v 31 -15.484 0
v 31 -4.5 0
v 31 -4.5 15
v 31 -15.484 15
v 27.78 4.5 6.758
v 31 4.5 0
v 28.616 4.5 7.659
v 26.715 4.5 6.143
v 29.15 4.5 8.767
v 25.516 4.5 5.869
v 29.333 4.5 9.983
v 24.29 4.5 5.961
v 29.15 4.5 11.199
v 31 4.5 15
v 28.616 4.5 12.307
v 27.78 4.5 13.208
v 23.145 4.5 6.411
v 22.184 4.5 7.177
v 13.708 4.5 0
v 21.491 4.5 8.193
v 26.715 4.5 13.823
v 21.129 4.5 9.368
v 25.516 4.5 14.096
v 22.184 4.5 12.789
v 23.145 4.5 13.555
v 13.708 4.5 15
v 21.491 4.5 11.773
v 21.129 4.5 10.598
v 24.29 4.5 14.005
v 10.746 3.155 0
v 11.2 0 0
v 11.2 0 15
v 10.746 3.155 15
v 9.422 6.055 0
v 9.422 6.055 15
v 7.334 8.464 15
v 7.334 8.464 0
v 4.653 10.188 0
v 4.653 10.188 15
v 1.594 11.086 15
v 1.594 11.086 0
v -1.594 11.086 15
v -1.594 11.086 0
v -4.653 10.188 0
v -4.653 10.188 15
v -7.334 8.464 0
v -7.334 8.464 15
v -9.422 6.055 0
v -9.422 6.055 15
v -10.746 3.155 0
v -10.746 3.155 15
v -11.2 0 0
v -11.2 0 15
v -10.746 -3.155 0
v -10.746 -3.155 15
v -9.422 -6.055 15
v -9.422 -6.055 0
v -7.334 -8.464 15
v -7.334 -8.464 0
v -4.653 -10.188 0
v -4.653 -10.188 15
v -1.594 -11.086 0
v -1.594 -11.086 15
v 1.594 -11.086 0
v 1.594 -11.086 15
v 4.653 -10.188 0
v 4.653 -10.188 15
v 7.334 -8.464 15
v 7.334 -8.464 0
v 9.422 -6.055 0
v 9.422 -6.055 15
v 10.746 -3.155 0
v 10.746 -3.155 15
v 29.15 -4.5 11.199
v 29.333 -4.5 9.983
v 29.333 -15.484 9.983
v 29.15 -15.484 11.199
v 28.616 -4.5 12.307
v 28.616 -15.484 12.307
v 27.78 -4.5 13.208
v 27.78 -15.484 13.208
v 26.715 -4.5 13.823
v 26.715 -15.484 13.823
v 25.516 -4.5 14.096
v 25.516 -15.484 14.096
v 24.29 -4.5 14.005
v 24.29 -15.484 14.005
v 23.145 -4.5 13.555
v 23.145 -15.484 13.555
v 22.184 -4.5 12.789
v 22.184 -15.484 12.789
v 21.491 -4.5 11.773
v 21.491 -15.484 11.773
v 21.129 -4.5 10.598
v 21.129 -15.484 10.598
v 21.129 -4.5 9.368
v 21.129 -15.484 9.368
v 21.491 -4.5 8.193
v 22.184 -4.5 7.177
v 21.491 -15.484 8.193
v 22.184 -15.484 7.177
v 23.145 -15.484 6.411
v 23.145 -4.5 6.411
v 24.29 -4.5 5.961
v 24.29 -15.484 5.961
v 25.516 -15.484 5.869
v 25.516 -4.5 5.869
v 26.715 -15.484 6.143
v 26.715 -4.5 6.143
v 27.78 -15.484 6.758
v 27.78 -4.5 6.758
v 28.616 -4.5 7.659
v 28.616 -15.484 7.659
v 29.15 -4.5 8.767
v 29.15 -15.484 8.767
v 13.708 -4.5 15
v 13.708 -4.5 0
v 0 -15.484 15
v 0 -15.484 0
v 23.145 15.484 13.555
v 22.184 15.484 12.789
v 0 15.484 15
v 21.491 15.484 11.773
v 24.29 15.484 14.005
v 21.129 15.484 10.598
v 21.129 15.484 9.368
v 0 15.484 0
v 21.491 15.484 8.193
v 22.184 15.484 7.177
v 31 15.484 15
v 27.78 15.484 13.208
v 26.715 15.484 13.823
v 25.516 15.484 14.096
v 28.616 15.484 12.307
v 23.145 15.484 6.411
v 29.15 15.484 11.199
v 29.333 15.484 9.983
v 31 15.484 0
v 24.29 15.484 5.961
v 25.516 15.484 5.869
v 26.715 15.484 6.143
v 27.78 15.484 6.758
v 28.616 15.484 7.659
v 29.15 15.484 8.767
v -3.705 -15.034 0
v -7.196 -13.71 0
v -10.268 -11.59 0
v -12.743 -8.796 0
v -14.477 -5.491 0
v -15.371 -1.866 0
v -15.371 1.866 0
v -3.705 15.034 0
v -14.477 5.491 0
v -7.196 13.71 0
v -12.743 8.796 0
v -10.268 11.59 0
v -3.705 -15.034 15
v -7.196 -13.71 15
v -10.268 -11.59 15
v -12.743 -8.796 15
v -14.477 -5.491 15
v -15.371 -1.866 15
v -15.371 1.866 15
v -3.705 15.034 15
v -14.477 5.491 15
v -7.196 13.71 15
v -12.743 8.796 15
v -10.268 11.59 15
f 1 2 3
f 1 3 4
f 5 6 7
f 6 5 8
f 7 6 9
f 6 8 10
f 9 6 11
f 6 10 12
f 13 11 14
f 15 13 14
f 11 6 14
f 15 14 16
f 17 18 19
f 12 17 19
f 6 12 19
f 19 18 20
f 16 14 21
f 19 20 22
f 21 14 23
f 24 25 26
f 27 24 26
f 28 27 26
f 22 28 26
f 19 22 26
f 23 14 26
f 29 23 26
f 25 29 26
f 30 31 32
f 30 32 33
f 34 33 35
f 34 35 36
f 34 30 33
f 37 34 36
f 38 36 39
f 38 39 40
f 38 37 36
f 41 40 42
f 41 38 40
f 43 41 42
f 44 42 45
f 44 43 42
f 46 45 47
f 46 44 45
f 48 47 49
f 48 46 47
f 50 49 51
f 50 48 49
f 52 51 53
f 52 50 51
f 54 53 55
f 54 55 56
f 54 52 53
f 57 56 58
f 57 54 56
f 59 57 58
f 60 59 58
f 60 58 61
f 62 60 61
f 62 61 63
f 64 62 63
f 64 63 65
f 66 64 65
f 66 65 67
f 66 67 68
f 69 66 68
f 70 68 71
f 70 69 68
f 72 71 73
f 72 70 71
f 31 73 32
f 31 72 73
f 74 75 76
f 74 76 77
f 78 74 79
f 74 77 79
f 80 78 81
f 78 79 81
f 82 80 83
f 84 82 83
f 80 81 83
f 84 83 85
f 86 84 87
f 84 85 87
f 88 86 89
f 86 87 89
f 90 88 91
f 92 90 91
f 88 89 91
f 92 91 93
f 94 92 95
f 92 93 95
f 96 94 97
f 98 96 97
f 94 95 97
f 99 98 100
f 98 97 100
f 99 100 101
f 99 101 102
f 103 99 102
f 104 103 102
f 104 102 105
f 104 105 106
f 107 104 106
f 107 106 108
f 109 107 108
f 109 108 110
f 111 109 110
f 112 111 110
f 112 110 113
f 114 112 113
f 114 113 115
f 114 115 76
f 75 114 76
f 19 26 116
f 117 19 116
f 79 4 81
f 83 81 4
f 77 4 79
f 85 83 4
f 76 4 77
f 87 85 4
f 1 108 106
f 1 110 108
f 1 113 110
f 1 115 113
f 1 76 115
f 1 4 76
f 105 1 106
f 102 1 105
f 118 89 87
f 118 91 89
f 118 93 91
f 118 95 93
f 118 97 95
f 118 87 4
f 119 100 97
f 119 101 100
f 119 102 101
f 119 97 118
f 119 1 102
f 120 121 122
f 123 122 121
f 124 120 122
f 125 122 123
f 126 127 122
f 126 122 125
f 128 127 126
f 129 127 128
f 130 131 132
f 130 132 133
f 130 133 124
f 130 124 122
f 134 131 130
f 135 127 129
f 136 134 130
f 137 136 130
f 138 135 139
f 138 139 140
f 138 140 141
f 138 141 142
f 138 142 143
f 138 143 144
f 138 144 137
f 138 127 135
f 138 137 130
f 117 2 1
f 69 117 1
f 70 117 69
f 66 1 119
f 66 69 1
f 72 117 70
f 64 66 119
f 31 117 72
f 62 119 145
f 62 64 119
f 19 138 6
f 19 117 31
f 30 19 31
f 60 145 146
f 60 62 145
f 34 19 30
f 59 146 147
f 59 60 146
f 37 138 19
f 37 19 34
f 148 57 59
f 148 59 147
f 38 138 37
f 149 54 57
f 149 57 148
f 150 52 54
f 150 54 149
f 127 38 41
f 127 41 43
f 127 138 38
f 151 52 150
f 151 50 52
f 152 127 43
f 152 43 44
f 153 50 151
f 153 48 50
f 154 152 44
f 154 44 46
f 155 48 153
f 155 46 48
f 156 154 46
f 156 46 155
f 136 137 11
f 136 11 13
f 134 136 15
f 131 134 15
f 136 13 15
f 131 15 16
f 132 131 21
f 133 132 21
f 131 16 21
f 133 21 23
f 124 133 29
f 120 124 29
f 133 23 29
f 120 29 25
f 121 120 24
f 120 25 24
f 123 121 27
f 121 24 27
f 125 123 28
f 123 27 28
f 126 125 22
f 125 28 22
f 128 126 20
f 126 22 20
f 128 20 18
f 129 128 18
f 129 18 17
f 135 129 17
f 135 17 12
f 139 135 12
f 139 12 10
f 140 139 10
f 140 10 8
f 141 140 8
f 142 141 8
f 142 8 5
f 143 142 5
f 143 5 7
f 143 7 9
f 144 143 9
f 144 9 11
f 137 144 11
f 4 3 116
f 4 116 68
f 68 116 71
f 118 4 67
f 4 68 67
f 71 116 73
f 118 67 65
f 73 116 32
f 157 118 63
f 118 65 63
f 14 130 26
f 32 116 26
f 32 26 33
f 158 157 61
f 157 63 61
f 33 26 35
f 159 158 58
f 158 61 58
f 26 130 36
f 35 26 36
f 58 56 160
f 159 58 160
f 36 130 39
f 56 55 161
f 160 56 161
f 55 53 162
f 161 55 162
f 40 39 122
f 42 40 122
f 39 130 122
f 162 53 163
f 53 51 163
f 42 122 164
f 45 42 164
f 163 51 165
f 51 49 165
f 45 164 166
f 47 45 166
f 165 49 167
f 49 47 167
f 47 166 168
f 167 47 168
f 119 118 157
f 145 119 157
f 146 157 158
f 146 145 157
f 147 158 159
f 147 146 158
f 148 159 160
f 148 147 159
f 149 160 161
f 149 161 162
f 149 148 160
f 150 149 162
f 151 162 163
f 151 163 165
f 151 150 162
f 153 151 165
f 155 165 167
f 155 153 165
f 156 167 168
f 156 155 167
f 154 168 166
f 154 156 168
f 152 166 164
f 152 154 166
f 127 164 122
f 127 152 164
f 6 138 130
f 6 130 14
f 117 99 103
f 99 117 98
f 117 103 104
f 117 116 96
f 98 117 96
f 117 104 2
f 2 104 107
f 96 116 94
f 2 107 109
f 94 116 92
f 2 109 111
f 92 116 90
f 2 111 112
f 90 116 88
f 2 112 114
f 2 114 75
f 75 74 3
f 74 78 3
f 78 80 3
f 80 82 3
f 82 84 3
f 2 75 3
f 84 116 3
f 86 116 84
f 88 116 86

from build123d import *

# Parameters (mm, degrees)
SKETCH1_R           = 11.2
BOSS_EXTRUDE1_DEPTH = 15
SKETCH2_R           = 4.125
CUT_EXTRUDE1_DEPTH  = 38
CUT_EXTRUDE2_DEPTH  = 38


with BuildPart() as part:
    # Sketch1 → Boss-Extrude1 (new body)
    with BuildSketch(Plane.XY):
        with BuildLine():
            Line((0, 15.483636231), (31, 15.483636231))
            Line((31, 15.483636231), (31, -15.483636231))
            Line((31, -15.483636231), (0, -15.483636231))
            ThreePointArc((0, -15.483636231), (-15.483636231, 0), (0, 15.483636231))
        make_face()
        Circle(SKETCH1_R, mode=Mode.SUBTRACT)
    extrude(amount=BOSS_EXTRUDE1_DEPTH)

    # Sketch2 → Cut-Extrude1 (cut)
    with BuildSketch(Plane.XZ.offset(15.483636231)):
        with Locations((25.207969837, 9.982935424)):
            Circle(SKETCH2_R)
    extrude(amount=-CUT_EXTRUDE1_DEPTH, mode=Mode.SUBTRACT)

    # Sketch7 → Cut-Extrude2 (cut)
    with BuildSketch(Plane.XY.offset(15)):
        Polygon((25.458117285, 4.5), (13.708117285, 4.5), (13.708117285, -4.5), (31, -4.5), (31, 4.5), align=None)
    extrude(amount=-CUT_EXTRUDE2_DEPTH, mode=Mode.SUBTRACT)


solid = part.part
